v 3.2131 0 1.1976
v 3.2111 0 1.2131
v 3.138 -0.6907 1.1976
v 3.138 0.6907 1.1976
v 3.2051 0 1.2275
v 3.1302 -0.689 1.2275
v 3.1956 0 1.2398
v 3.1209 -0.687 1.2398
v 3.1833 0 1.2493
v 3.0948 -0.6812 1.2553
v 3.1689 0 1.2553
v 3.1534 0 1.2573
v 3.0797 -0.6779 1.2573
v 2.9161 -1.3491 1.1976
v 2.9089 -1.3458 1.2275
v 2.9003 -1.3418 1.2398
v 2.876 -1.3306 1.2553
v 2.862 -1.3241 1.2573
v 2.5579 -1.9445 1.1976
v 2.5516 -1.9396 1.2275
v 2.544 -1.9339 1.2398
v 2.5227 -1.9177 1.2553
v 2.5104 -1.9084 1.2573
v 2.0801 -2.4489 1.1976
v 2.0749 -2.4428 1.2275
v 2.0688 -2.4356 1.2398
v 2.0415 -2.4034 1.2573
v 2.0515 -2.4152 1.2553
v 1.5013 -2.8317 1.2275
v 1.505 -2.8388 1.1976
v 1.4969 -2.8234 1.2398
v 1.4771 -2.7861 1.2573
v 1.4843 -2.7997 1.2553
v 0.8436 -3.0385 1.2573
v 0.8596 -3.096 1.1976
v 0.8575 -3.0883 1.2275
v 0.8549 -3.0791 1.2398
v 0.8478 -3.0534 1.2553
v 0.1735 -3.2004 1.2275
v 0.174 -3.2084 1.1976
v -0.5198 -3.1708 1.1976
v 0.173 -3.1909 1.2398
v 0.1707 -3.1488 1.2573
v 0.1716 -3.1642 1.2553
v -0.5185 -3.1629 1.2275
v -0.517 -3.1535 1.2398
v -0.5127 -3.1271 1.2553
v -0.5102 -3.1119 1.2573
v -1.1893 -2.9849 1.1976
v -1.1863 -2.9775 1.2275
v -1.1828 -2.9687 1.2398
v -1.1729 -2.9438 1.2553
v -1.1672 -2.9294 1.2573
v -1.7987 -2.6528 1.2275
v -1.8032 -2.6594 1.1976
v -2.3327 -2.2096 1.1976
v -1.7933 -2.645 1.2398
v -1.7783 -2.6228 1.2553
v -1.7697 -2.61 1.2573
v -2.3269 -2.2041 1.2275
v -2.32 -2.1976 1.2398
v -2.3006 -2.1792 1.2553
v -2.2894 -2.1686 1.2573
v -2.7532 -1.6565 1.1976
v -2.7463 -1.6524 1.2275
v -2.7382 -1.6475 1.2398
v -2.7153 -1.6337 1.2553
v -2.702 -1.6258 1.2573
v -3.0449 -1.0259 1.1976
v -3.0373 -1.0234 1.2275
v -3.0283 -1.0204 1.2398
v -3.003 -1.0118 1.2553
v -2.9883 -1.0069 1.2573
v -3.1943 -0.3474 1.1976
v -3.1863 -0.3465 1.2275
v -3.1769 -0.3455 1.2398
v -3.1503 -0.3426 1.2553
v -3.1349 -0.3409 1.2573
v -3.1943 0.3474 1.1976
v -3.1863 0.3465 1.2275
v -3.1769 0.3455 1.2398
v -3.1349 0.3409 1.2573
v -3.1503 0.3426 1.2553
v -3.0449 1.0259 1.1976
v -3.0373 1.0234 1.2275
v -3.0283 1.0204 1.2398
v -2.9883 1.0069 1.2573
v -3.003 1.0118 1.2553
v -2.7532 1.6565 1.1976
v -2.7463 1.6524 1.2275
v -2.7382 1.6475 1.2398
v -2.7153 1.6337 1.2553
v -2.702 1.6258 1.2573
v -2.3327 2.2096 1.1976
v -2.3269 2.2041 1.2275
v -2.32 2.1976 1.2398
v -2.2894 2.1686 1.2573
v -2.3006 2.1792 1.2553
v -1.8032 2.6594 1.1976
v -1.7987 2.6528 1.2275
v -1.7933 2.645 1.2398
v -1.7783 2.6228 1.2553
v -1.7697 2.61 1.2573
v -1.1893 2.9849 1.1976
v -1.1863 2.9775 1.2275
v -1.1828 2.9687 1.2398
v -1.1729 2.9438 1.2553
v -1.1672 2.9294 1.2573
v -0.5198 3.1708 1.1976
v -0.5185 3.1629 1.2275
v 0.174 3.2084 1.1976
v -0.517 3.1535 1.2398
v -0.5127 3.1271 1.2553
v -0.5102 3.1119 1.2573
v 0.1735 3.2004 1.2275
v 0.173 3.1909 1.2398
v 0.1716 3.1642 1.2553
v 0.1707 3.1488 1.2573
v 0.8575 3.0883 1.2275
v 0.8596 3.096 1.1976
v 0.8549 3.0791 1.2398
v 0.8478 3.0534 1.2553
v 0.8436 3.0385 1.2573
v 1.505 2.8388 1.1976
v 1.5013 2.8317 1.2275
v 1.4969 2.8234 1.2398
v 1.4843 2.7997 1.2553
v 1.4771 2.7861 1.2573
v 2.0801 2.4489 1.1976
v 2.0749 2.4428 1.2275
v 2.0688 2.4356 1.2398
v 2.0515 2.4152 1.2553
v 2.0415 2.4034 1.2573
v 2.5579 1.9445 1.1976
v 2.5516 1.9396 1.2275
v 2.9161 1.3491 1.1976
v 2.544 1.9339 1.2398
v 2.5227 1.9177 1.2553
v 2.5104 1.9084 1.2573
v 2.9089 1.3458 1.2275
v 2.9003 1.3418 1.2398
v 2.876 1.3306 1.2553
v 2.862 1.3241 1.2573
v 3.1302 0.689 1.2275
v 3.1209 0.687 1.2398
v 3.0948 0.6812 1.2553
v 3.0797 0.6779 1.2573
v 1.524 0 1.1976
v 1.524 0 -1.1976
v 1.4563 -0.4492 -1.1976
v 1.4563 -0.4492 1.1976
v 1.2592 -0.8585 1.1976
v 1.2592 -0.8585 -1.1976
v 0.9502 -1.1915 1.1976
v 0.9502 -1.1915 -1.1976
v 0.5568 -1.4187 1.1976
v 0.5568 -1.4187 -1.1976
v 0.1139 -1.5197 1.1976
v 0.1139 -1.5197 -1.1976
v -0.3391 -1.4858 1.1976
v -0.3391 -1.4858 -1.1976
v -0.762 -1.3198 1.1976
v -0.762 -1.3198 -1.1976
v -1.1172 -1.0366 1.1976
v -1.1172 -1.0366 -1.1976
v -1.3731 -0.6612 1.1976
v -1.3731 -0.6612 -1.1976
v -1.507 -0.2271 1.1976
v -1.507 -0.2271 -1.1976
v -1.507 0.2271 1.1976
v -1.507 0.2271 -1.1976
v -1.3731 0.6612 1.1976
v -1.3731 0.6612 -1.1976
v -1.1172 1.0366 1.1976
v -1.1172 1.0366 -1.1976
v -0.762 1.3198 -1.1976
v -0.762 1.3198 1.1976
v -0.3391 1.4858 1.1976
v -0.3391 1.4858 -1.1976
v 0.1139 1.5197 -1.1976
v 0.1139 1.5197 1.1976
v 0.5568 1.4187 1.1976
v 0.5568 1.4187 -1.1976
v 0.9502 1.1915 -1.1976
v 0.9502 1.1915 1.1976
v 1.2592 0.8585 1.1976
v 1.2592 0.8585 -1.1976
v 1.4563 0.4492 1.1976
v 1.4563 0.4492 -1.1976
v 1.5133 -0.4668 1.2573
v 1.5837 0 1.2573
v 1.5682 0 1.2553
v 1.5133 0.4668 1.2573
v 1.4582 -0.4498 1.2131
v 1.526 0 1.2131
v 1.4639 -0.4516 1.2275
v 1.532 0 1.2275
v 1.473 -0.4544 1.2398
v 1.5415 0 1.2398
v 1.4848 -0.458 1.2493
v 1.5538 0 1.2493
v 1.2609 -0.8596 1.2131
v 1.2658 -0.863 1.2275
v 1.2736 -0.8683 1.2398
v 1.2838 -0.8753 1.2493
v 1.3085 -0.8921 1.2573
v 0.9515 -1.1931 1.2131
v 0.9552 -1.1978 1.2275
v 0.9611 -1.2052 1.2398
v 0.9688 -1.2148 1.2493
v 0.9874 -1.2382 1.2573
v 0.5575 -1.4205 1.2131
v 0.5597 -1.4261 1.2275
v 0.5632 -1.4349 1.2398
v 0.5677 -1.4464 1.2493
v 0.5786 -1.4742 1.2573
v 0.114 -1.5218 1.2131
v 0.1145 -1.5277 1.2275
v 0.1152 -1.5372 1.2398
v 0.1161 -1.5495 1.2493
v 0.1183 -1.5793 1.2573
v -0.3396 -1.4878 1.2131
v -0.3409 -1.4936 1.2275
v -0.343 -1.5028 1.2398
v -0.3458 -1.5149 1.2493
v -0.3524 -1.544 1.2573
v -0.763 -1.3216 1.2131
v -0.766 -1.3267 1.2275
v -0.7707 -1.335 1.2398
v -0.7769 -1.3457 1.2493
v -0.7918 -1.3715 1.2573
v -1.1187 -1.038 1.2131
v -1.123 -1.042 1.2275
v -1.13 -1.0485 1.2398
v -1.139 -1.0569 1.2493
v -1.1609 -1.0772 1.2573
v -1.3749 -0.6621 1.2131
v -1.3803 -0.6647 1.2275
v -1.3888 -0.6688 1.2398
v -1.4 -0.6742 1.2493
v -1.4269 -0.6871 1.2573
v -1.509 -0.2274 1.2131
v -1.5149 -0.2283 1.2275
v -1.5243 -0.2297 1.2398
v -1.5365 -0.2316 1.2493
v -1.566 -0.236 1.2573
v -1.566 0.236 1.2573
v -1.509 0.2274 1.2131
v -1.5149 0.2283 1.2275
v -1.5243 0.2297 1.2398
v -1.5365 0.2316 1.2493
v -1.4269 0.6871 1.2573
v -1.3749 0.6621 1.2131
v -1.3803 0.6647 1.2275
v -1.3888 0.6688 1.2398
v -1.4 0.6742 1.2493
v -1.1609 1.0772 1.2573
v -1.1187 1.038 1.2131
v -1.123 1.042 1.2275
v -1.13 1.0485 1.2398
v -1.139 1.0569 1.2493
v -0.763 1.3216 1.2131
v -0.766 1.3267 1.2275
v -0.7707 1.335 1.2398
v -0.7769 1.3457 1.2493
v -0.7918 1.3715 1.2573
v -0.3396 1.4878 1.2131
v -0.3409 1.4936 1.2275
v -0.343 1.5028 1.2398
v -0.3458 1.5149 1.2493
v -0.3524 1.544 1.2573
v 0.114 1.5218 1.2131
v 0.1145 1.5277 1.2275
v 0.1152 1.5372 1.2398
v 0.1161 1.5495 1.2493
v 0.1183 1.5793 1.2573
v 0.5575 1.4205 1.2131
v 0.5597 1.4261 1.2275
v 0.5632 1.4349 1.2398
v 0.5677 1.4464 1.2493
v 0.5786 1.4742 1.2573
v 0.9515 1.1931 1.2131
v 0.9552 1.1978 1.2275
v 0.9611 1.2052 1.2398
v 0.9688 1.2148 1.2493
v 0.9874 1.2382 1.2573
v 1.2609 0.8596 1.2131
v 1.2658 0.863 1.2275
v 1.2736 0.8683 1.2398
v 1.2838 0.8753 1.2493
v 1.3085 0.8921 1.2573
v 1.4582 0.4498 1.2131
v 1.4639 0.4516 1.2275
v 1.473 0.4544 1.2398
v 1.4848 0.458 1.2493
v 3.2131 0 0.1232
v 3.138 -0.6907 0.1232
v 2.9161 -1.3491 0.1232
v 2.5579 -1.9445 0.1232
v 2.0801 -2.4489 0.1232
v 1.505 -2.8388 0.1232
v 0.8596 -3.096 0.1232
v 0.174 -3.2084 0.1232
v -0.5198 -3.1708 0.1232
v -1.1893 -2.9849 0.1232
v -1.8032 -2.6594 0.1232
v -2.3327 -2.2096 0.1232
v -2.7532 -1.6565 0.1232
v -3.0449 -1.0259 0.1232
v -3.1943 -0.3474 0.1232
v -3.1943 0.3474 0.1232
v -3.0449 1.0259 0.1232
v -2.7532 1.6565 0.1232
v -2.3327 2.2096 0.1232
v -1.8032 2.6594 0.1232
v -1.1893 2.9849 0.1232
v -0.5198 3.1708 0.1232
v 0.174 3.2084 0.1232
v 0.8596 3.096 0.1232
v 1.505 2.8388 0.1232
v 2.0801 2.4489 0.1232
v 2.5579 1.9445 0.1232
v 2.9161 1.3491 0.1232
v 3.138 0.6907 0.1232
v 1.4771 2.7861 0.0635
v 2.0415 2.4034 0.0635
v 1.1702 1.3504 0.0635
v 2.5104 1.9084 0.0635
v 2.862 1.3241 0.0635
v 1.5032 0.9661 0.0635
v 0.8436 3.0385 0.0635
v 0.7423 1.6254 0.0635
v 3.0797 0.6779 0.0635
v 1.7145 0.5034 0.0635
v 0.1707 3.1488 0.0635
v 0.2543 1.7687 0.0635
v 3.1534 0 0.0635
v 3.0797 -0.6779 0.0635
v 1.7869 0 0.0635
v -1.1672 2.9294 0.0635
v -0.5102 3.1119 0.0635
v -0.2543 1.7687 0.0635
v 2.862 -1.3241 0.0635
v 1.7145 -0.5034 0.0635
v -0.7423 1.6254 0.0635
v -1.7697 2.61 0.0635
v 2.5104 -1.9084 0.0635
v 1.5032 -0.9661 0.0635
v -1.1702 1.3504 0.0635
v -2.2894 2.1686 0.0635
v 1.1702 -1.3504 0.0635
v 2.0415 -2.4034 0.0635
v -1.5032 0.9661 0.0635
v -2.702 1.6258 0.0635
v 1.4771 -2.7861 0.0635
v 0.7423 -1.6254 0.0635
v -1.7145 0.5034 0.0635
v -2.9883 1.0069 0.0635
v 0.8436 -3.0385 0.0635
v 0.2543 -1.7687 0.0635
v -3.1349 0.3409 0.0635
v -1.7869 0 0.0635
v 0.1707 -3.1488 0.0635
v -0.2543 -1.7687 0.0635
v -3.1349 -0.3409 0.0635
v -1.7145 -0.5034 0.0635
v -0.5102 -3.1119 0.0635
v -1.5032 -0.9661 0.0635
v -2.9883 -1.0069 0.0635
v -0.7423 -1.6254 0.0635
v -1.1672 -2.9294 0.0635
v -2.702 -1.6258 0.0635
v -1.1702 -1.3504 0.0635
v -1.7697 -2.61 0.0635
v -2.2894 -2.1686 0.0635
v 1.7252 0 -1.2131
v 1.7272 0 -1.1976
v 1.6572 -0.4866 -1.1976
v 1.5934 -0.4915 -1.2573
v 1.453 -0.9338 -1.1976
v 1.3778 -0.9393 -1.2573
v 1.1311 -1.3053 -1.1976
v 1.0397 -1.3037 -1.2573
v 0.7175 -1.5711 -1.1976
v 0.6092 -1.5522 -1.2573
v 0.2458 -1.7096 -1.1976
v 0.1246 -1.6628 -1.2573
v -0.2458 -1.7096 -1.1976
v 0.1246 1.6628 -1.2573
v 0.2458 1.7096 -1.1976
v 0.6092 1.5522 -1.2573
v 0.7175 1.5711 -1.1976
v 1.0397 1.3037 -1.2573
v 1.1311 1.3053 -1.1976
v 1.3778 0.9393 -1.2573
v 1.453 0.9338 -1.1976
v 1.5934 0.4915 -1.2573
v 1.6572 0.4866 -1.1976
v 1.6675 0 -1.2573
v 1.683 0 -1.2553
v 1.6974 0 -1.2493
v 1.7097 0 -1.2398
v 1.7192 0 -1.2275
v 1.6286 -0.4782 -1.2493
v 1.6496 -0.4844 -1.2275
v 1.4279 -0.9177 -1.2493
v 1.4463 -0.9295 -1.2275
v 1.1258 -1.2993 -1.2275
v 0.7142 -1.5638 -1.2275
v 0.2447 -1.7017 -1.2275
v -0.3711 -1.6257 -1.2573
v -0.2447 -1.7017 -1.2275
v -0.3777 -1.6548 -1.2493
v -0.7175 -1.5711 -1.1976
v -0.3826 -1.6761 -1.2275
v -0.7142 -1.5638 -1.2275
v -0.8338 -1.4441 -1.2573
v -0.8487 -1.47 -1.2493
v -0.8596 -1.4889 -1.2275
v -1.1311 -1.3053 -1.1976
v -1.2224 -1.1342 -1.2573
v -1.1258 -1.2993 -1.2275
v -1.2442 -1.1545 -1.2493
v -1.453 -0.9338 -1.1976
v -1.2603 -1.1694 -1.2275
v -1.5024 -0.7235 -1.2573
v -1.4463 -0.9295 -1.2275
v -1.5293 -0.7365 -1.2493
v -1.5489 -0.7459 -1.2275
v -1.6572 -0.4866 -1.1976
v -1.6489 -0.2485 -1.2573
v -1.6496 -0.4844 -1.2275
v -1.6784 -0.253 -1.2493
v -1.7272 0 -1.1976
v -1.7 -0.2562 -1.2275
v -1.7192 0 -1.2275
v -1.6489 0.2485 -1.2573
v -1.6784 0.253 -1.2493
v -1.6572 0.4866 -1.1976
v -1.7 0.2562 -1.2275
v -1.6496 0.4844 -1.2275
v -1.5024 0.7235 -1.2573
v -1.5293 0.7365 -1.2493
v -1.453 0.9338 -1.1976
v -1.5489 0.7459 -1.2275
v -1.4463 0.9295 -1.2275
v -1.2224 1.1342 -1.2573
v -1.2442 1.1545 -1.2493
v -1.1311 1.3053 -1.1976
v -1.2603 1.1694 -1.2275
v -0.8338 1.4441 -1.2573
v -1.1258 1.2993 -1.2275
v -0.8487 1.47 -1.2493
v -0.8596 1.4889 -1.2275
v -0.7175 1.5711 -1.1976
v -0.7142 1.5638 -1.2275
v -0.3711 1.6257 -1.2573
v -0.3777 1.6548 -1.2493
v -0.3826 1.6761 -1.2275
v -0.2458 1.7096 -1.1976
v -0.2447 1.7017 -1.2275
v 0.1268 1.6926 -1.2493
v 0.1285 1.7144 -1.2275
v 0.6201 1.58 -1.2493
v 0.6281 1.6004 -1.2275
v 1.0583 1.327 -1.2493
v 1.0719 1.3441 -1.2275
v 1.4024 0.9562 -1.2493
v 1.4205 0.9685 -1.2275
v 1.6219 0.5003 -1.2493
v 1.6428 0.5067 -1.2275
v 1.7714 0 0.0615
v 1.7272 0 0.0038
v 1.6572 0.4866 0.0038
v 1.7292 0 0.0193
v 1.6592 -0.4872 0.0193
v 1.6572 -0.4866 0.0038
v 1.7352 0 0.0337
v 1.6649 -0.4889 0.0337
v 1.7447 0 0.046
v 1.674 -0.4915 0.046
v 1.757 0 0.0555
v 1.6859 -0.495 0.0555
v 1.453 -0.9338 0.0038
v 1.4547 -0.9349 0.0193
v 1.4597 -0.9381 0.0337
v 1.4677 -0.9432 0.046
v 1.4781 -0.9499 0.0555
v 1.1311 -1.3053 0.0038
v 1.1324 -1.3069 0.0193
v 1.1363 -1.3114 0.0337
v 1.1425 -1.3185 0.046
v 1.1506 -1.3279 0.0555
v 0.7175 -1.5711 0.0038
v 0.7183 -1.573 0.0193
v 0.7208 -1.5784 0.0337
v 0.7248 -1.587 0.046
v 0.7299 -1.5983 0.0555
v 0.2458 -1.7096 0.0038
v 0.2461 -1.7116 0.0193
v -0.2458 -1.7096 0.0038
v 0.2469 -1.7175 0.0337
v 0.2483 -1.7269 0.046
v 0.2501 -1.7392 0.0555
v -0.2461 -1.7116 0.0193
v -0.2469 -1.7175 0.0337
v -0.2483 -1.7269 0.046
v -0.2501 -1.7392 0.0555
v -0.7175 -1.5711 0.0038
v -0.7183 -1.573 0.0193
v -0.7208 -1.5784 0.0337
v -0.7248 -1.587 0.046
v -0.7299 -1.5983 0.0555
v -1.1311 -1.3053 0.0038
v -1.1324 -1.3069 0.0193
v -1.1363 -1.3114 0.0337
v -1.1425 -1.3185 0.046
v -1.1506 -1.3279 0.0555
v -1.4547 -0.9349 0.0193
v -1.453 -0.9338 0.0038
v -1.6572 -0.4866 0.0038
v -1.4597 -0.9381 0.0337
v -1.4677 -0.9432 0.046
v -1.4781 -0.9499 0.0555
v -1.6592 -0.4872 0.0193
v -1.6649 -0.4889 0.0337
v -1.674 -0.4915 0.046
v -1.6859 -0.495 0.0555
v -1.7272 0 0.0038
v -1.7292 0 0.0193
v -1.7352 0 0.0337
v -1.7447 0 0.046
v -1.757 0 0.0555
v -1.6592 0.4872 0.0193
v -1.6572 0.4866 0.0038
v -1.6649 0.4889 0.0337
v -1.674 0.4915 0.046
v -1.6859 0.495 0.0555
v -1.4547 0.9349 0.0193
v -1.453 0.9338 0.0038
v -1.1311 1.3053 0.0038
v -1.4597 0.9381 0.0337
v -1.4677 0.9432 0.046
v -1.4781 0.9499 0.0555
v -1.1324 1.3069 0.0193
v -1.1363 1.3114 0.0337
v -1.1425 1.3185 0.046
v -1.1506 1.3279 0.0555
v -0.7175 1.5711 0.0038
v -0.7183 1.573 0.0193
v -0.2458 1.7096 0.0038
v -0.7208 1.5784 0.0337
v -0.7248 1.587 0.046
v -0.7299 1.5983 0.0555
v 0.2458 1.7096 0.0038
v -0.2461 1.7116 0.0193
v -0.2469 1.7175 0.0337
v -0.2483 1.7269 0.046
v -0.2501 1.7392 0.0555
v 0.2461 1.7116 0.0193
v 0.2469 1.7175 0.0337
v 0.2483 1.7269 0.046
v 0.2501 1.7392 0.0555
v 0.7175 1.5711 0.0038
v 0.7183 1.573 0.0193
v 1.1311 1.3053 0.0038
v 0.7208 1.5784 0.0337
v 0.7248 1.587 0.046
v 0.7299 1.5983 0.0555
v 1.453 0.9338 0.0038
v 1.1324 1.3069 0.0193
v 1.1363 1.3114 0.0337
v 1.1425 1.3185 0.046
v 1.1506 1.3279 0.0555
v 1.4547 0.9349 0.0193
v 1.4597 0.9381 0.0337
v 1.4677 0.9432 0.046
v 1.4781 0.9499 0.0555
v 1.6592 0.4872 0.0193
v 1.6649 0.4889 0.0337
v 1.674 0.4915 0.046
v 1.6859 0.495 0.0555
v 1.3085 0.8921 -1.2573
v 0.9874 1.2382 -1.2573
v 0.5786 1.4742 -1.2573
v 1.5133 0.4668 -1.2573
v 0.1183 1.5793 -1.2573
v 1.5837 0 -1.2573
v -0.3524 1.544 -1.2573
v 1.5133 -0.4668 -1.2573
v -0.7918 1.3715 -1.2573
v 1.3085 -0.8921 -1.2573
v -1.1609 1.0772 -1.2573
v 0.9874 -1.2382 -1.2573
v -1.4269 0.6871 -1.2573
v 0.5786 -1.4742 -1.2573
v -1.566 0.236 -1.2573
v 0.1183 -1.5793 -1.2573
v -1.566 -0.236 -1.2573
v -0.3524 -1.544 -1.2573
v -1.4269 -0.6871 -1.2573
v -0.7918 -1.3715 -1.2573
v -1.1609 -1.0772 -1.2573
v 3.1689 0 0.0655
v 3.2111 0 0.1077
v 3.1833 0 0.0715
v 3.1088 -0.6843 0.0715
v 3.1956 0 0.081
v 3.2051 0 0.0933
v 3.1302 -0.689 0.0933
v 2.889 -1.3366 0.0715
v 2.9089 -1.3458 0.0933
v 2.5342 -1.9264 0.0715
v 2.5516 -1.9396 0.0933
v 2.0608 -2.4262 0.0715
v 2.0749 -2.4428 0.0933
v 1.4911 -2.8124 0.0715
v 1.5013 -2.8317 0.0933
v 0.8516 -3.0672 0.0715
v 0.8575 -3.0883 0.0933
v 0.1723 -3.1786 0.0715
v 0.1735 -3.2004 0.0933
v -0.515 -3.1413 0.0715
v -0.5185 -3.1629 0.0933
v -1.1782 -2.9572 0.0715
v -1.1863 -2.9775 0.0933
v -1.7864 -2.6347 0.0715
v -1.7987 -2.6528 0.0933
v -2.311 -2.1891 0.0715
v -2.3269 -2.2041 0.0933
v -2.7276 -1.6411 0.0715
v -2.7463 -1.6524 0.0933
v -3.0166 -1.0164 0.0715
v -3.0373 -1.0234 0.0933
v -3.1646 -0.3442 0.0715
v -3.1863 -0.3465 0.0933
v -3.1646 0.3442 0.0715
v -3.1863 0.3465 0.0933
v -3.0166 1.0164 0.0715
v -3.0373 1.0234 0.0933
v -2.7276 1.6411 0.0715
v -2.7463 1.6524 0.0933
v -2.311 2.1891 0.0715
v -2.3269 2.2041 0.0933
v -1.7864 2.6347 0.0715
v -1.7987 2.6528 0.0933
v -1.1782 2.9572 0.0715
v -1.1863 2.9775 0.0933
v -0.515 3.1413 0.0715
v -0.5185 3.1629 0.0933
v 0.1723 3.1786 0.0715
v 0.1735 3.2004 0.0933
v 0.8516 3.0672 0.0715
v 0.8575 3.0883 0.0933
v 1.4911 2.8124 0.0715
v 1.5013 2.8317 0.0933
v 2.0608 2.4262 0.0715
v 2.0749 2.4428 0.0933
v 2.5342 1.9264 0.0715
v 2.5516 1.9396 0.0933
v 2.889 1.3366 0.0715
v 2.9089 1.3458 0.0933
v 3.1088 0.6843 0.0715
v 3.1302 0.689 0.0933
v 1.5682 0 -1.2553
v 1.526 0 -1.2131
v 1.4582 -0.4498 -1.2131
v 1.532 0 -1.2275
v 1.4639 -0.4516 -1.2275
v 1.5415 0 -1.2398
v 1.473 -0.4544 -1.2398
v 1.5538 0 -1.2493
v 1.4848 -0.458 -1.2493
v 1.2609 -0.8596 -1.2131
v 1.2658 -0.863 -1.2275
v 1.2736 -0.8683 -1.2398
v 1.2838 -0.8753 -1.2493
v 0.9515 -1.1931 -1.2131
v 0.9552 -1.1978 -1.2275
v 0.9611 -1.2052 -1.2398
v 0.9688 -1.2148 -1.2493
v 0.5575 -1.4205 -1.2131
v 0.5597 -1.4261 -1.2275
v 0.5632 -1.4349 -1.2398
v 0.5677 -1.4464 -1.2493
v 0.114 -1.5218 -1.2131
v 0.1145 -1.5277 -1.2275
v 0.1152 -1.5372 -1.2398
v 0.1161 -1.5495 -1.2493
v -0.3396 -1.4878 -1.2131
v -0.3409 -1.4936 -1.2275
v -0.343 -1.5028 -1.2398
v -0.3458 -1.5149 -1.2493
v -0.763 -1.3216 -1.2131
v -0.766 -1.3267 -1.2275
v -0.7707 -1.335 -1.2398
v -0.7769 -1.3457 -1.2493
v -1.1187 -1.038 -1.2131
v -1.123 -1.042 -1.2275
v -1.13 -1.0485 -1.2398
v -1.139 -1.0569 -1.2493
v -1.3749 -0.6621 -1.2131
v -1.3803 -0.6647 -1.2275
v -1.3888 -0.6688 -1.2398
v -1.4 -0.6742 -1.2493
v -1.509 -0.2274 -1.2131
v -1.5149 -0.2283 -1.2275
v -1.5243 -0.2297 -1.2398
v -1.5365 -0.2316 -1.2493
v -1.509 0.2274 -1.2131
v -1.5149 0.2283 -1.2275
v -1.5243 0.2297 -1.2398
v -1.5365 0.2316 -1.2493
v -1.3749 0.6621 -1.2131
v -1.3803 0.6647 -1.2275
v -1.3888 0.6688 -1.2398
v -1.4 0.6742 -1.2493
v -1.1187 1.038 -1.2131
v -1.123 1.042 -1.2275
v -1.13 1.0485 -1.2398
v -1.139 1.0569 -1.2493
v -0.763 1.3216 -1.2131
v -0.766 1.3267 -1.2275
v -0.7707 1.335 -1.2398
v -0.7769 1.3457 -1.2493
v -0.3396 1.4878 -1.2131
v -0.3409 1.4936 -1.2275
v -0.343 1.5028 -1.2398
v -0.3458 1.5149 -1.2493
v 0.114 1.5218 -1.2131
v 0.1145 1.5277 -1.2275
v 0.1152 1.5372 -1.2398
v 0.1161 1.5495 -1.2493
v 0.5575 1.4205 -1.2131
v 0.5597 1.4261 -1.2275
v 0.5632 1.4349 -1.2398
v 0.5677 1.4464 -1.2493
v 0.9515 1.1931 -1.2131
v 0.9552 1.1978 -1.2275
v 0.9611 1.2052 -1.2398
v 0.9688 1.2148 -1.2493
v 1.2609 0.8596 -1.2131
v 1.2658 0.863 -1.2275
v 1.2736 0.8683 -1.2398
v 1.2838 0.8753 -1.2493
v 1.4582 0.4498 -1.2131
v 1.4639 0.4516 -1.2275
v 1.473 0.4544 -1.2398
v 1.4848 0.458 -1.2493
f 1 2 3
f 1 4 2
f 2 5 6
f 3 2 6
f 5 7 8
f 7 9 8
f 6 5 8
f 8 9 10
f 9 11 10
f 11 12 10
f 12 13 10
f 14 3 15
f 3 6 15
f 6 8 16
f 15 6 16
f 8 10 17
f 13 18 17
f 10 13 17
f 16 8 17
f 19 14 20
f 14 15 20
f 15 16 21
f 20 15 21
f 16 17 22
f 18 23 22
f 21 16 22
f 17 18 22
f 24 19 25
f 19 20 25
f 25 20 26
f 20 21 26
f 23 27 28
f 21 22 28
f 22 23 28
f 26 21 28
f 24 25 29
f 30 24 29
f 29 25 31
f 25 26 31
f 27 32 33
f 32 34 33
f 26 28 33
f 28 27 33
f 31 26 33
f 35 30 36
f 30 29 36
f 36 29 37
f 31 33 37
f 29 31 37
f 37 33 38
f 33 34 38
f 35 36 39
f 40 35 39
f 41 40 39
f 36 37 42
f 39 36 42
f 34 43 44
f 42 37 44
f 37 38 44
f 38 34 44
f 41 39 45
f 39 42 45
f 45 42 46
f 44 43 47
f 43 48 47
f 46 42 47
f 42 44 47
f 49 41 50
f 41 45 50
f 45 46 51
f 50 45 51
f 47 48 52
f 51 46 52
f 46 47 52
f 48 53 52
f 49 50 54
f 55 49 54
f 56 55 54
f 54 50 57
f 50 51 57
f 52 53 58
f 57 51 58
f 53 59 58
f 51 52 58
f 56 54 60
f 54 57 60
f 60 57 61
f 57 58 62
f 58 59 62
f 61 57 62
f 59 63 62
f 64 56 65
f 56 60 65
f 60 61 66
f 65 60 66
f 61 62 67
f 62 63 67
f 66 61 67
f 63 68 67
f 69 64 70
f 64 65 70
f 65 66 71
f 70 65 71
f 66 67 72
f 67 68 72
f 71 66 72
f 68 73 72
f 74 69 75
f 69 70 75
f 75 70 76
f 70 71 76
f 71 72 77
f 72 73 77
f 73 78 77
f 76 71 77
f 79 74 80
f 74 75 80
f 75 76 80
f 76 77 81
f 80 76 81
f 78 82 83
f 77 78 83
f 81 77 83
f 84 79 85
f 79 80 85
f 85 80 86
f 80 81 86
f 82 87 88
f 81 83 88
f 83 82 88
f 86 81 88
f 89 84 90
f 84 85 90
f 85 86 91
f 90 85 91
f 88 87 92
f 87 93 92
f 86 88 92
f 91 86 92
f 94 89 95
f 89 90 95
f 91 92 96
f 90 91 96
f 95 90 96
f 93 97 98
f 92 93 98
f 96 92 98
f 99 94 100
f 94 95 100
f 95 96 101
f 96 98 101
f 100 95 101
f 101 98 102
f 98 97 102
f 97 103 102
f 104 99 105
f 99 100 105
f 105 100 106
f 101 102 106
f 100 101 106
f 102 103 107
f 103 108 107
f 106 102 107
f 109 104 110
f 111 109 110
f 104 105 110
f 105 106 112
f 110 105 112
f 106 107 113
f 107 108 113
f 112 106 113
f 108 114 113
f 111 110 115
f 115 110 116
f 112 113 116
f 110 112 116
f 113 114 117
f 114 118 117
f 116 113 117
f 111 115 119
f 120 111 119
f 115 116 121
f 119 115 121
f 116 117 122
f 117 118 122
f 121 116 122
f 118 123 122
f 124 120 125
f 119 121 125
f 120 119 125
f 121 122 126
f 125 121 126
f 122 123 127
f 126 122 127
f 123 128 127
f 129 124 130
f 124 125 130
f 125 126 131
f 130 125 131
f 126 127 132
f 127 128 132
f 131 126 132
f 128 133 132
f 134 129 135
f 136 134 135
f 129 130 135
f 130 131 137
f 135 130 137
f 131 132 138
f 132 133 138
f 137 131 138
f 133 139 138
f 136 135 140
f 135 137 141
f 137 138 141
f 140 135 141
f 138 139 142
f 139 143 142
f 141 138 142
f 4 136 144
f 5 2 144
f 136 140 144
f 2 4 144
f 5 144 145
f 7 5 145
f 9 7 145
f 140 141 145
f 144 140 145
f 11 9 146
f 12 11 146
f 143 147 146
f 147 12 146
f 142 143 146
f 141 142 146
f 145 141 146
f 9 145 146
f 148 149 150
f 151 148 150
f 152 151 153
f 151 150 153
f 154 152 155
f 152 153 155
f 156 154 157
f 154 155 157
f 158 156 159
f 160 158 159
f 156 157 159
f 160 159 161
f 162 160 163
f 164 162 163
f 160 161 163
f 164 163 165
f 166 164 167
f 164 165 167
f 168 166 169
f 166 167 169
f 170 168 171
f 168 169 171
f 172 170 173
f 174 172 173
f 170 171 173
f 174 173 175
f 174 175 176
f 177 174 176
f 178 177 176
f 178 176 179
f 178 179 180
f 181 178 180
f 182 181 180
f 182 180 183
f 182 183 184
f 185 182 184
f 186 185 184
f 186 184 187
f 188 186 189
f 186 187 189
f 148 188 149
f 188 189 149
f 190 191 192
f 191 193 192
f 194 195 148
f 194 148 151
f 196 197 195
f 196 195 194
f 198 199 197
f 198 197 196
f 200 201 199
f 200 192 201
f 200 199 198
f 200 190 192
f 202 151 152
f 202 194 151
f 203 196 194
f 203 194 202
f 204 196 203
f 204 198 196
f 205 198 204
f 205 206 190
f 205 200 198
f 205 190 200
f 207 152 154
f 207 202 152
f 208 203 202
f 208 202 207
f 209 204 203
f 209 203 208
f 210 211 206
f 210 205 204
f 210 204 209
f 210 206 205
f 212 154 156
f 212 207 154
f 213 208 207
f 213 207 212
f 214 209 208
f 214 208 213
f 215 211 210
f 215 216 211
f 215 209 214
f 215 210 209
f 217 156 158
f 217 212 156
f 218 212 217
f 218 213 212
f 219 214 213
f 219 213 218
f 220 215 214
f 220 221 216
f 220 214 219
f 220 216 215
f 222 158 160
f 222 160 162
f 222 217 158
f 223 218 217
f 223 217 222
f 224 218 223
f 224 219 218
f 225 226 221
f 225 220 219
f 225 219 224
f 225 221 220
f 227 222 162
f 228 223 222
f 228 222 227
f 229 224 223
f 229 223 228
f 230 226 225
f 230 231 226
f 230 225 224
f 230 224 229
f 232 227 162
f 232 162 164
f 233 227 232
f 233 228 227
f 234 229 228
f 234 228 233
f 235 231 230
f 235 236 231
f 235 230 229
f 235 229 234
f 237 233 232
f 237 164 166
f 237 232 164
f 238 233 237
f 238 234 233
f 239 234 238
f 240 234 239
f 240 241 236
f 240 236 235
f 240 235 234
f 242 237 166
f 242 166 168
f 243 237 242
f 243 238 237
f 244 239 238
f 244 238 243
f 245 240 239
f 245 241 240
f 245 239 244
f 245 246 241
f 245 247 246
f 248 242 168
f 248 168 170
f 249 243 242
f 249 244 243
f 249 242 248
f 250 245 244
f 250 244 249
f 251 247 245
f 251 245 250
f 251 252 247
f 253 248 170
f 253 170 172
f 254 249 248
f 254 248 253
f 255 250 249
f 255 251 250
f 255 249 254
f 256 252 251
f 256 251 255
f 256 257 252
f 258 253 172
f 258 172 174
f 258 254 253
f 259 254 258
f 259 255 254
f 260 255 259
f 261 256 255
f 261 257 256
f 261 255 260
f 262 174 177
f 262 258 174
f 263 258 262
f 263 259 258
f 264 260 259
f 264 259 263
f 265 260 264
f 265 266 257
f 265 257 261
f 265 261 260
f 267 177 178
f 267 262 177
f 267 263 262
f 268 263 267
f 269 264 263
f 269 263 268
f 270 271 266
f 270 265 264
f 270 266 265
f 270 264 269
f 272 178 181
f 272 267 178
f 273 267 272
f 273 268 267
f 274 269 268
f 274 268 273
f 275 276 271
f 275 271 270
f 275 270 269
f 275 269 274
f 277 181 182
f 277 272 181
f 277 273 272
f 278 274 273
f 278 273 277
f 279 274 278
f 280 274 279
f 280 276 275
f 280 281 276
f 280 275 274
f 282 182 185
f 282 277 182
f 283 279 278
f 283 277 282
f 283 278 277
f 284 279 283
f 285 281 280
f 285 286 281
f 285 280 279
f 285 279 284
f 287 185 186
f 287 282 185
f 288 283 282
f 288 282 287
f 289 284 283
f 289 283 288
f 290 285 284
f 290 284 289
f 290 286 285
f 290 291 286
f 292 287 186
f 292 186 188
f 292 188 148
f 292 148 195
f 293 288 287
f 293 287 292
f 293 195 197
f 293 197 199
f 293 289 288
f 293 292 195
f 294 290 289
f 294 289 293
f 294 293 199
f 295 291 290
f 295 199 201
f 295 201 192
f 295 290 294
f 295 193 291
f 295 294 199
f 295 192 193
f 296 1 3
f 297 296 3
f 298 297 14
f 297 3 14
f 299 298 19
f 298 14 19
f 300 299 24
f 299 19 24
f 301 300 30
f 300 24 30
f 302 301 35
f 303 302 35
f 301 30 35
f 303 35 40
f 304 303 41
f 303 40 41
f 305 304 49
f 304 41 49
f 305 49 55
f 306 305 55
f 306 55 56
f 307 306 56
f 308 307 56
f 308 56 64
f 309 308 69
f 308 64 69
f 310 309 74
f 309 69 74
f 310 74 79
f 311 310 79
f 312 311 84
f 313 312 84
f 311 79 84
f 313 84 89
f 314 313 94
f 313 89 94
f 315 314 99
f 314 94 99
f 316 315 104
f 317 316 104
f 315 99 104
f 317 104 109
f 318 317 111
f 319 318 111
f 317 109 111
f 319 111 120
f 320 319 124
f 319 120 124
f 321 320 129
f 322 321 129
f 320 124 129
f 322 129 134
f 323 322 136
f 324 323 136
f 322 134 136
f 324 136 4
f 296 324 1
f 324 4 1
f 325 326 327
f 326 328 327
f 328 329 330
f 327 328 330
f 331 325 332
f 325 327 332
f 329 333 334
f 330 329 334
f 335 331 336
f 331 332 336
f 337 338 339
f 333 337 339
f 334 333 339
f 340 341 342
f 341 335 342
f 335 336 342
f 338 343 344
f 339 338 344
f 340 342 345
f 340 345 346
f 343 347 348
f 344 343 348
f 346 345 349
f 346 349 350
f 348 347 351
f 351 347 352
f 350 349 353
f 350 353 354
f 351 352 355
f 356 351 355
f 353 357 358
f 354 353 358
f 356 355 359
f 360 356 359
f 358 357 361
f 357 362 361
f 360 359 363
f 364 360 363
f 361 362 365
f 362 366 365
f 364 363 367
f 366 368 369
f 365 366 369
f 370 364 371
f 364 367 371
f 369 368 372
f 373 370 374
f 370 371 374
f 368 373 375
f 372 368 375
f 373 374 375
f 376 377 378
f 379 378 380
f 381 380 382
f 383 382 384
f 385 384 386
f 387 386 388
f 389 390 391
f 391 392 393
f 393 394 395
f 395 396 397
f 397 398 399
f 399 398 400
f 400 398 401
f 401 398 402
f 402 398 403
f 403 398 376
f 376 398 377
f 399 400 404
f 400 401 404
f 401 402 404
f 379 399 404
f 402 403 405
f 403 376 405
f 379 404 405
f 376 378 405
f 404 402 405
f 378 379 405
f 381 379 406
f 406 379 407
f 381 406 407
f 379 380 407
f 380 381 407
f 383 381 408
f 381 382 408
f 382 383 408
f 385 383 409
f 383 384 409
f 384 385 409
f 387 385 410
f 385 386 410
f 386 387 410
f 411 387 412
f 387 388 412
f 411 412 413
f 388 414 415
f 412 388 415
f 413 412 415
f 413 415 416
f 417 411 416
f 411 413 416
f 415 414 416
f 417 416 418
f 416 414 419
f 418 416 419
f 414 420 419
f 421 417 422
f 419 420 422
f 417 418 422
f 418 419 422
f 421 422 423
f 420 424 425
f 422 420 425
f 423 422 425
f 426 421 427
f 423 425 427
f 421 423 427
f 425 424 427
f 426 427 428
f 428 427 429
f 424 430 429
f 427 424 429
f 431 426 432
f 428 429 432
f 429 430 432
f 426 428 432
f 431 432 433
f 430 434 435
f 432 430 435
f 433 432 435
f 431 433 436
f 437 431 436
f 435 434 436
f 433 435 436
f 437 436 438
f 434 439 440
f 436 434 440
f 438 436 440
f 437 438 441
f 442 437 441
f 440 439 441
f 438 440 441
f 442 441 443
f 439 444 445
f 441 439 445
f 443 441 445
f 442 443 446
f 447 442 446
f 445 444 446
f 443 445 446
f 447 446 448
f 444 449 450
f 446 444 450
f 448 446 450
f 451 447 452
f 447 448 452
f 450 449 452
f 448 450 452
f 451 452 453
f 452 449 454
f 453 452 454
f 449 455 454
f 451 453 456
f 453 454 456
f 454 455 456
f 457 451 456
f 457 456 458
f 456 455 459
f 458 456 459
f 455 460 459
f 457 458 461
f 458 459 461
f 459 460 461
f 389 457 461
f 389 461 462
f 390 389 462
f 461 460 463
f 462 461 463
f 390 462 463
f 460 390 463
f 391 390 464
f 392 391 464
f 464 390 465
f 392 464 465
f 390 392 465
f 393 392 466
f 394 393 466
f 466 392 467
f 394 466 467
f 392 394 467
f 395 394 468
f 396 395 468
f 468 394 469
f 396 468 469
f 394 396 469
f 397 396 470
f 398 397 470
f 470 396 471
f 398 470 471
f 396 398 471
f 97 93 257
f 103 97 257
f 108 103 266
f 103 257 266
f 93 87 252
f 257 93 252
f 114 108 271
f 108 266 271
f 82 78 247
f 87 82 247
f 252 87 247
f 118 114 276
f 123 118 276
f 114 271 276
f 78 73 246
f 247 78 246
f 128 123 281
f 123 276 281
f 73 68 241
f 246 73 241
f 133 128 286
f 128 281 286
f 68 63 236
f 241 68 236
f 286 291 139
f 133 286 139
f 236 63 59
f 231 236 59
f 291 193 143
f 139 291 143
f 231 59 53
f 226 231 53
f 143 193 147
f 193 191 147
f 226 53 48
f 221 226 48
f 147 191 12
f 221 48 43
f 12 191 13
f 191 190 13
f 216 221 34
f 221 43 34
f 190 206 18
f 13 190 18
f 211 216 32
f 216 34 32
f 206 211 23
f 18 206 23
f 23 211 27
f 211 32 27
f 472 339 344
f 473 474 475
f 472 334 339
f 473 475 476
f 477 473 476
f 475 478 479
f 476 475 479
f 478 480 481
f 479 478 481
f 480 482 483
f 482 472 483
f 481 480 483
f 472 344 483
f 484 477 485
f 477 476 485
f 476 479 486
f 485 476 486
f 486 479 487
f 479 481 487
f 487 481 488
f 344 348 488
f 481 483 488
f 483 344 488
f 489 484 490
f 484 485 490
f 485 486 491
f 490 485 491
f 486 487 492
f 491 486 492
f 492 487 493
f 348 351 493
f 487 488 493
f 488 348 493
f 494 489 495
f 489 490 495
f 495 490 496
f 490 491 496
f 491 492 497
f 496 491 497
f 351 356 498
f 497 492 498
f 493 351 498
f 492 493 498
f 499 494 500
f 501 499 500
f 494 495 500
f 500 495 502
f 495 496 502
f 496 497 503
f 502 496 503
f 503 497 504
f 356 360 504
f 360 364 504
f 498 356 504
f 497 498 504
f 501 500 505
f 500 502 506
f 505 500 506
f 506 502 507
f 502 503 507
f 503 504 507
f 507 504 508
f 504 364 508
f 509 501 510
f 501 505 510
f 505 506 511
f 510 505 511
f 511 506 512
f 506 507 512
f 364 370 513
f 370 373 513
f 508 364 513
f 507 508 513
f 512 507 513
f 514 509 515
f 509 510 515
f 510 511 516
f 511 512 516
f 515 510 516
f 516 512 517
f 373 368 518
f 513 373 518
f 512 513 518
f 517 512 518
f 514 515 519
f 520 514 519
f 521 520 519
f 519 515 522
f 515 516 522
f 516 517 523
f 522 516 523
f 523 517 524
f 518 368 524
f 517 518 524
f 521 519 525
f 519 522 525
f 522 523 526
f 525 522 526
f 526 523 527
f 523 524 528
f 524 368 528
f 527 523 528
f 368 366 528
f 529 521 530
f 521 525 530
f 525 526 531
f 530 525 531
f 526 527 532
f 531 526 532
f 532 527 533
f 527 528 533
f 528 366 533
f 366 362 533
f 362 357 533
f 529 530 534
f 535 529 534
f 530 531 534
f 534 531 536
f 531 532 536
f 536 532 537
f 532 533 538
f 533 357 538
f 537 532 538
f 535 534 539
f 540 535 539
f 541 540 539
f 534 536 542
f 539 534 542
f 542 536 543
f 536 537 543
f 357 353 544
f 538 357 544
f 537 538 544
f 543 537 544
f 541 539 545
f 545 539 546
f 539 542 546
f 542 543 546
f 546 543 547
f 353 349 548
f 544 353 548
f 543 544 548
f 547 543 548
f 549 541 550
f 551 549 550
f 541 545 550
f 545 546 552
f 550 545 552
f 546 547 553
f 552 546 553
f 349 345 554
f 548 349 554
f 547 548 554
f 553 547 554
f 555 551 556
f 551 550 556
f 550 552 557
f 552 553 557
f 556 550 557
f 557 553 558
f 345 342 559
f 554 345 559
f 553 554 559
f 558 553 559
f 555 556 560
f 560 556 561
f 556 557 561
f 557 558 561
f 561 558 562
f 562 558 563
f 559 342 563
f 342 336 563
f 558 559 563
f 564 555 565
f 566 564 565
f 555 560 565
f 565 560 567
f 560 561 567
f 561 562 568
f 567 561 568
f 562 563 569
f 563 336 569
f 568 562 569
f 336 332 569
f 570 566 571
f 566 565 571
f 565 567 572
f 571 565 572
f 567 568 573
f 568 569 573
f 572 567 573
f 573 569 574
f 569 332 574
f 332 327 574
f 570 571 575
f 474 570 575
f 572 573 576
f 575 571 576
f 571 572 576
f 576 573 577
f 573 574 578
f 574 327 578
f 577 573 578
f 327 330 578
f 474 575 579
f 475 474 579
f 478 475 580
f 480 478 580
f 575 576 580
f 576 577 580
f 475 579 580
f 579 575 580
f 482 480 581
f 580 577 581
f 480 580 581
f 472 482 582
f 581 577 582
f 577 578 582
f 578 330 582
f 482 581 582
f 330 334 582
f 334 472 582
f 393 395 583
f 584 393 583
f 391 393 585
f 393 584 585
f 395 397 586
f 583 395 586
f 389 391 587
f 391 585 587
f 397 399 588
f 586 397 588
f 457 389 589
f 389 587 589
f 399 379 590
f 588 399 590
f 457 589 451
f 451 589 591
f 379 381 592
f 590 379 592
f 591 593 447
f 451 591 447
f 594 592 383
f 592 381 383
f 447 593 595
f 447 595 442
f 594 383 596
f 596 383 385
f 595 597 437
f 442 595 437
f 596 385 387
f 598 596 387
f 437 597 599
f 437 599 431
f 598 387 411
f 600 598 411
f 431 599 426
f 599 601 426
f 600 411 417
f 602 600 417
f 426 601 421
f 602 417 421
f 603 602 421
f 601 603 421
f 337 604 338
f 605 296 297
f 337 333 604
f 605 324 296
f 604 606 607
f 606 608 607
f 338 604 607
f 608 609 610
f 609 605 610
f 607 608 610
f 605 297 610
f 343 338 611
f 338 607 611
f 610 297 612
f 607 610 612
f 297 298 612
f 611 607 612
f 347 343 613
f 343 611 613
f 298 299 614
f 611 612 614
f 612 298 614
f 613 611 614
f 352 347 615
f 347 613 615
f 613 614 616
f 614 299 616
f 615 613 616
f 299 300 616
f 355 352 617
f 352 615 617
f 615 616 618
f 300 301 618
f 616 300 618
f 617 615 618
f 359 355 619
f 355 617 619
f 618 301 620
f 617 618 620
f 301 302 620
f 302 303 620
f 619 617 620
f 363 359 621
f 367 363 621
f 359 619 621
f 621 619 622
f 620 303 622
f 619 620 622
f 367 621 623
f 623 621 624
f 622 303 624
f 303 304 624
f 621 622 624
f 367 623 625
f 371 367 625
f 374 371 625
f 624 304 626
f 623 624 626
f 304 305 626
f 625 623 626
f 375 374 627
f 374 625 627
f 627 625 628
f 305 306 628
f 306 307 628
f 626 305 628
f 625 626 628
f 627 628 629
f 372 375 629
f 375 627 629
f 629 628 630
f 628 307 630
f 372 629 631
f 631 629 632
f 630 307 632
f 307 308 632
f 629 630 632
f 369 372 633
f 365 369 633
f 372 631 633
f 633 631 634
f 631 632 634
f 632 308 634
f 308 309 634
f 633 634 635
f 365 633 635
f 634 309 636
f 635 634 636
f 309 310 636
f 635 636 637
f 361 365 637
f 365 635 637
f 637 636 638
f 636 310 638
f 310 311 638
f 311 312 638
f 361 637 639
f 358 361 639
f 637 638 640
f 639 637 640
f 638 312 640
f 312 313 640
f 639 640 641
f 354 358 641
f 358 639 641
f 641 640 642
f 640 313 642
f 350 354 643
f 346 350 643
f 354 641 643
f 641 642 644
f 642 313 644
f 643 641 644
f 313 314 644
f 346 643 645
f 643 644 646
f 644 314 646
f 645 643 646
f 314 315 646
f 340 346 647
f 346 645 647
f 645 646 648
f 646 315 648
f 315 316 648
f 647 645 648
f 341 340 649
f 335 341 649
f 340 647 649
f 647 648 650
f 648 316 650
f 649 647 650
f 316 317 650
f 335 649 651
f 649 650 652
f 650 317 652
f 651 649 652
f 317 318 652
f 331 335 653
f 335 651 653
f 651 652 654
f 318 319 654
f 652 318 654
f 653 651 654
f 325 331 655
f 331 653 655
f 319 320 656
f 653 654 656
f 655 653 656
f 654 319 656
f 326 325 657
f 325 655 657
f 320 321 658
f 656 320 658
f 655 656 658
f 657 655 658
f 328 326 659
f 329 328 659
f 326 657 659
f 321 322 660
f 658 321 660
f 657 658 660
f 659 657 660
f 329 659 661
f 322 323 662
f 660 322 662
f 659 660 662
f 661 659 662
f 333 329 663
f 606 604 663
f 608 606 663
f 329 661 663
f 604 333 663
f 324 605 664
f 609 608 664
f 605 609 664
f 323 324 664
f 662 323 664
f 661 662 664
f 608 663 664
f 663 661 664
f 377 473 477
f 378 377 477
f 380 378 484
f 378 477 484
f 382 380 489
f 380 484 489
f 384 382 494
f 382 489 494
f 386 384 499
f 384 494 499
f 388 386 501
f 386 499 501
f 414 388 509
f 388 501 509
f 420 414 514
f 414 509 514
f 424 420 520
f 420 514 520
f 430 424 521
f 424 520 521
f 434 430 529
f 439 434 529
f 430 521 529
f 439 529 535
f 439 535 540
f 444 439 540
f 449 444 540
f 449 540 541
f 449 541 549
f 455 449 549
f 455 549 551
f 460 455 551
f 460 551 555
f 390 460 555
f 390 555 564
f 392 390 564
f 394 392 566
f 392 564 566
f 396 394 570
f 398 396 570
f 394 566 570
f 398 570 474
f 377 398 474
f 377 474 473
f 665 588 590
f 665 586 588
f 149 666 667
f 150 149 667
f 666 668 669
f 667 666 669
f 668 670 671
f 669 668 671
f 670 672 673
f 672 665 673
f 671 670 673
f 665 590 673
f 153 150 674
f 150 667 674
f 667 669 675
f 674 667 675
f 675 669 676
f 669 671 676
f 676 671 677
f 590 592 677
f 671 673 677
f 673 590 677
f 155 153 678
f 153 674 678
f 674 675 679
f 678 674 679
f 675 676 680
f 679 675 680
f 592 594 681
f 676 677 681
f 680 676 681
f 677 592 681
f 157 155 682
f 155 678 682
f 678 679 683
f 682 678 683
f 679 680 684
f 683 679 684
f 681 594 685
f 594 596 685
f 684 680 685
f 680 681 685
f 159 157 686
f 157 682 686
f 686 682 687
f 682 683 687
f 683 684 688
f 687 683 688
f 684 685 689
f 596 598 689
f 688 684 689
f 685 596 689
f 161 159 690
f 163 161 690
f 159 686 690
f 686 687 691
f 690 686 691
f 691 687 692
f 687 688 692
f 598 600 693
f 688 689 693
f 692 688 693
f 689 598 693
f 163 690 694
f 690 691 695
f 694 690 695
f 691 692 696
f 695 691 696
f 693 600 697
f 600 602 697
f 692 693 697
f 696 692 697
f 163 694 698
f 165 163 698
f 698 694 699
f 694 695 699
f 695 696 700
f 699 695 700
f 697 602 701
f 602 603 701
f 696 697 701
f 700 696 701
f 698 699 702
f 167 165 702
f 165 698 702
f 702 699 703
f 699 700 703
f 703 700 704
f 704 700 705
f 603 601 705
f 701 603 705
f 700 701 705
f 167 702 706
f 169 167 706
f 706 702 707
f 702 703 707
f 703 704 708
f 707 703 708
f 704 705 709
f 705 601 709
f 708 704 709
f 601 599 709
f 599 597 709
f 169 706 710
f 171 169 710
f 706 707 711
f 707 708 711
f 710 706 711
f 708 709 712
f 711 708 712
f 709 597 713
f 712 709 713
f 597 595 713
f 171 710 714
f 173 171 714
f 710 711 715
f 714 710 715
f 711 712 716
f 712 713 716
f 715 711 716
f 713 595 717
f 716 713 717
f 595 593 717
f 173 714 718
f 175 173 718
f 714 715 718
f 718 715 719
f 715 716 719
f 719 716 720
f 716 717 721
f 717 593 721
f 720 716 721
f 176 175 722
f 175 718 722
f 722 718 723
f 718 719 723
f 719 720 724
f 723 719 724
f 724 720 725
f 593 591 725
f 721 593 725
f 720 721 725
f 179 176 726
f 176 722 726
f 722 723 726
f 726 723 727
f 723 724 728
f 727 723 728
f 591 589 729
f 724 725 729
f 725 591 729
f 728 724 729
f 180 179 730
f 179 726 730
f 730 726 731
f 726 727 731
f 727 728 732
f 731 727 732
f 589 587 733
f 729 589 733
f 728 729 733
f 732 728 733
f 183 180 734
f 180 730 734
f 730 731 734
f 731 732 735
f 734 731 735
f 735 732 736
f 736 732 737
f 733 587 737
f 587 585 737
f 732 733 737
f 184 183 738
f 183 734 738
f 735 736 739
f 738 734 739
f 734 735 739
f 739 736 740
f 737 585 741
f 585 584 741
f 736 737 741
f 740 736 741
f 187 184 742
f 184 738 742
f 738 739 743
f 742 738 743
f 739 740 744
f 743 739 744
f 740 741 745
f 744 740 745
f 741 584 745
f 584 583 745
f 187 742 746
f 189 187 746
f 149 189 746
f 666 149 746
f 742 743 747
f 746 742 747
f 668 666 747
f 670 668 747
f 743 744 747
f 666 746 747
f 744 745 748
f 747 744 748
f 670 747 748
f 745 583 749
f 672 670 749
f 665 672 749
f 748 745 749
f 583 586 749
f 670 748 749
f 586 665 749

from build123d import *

# Parameters (mm, degrees)
FILLET1_R = 0.05969


with BuildPart() as part:
    # Sketch2 → Revolve1 (revolve)
    with BuildSketch(Plane(origin=(0, 0, 0), x_dir=(0, 0, -1), z_dir=(1, 0, 0)), mode=Mode.PRIVATE) as revolve1_sk:
        Polygon((-1.2573, 1.524), (1.2573, 1.524), (1.2573, 1.7272), (-0.0635, 1.7272), (-0.0635, 3.2131), (-1.2573, 3.2131), align=None)
    revolve(revolve1_sk.sketch.rotate(Axis((0, 0, 1.2573), (0, 0, -1)), 90), axis=Axis((0, 0, 1.2573), (0, 0, -1)))

    # Fillet1
    fillet1_edges = [part.edges().sort_by_distance(p)[0] for p in [
        (-3.2131, 0, 1.2573),
        (-3.2131, 0, 0.0635),
        (-1.7272, 0, 0.0635),
        (-1.7272, 0, -1.2573),
        (-1.524, 0, -1.2573),
        (-1.524, 0, 1.2573),
    ]]
    fillet(fillet1_edges, radius=FILLET1_R)


solid = part.part
